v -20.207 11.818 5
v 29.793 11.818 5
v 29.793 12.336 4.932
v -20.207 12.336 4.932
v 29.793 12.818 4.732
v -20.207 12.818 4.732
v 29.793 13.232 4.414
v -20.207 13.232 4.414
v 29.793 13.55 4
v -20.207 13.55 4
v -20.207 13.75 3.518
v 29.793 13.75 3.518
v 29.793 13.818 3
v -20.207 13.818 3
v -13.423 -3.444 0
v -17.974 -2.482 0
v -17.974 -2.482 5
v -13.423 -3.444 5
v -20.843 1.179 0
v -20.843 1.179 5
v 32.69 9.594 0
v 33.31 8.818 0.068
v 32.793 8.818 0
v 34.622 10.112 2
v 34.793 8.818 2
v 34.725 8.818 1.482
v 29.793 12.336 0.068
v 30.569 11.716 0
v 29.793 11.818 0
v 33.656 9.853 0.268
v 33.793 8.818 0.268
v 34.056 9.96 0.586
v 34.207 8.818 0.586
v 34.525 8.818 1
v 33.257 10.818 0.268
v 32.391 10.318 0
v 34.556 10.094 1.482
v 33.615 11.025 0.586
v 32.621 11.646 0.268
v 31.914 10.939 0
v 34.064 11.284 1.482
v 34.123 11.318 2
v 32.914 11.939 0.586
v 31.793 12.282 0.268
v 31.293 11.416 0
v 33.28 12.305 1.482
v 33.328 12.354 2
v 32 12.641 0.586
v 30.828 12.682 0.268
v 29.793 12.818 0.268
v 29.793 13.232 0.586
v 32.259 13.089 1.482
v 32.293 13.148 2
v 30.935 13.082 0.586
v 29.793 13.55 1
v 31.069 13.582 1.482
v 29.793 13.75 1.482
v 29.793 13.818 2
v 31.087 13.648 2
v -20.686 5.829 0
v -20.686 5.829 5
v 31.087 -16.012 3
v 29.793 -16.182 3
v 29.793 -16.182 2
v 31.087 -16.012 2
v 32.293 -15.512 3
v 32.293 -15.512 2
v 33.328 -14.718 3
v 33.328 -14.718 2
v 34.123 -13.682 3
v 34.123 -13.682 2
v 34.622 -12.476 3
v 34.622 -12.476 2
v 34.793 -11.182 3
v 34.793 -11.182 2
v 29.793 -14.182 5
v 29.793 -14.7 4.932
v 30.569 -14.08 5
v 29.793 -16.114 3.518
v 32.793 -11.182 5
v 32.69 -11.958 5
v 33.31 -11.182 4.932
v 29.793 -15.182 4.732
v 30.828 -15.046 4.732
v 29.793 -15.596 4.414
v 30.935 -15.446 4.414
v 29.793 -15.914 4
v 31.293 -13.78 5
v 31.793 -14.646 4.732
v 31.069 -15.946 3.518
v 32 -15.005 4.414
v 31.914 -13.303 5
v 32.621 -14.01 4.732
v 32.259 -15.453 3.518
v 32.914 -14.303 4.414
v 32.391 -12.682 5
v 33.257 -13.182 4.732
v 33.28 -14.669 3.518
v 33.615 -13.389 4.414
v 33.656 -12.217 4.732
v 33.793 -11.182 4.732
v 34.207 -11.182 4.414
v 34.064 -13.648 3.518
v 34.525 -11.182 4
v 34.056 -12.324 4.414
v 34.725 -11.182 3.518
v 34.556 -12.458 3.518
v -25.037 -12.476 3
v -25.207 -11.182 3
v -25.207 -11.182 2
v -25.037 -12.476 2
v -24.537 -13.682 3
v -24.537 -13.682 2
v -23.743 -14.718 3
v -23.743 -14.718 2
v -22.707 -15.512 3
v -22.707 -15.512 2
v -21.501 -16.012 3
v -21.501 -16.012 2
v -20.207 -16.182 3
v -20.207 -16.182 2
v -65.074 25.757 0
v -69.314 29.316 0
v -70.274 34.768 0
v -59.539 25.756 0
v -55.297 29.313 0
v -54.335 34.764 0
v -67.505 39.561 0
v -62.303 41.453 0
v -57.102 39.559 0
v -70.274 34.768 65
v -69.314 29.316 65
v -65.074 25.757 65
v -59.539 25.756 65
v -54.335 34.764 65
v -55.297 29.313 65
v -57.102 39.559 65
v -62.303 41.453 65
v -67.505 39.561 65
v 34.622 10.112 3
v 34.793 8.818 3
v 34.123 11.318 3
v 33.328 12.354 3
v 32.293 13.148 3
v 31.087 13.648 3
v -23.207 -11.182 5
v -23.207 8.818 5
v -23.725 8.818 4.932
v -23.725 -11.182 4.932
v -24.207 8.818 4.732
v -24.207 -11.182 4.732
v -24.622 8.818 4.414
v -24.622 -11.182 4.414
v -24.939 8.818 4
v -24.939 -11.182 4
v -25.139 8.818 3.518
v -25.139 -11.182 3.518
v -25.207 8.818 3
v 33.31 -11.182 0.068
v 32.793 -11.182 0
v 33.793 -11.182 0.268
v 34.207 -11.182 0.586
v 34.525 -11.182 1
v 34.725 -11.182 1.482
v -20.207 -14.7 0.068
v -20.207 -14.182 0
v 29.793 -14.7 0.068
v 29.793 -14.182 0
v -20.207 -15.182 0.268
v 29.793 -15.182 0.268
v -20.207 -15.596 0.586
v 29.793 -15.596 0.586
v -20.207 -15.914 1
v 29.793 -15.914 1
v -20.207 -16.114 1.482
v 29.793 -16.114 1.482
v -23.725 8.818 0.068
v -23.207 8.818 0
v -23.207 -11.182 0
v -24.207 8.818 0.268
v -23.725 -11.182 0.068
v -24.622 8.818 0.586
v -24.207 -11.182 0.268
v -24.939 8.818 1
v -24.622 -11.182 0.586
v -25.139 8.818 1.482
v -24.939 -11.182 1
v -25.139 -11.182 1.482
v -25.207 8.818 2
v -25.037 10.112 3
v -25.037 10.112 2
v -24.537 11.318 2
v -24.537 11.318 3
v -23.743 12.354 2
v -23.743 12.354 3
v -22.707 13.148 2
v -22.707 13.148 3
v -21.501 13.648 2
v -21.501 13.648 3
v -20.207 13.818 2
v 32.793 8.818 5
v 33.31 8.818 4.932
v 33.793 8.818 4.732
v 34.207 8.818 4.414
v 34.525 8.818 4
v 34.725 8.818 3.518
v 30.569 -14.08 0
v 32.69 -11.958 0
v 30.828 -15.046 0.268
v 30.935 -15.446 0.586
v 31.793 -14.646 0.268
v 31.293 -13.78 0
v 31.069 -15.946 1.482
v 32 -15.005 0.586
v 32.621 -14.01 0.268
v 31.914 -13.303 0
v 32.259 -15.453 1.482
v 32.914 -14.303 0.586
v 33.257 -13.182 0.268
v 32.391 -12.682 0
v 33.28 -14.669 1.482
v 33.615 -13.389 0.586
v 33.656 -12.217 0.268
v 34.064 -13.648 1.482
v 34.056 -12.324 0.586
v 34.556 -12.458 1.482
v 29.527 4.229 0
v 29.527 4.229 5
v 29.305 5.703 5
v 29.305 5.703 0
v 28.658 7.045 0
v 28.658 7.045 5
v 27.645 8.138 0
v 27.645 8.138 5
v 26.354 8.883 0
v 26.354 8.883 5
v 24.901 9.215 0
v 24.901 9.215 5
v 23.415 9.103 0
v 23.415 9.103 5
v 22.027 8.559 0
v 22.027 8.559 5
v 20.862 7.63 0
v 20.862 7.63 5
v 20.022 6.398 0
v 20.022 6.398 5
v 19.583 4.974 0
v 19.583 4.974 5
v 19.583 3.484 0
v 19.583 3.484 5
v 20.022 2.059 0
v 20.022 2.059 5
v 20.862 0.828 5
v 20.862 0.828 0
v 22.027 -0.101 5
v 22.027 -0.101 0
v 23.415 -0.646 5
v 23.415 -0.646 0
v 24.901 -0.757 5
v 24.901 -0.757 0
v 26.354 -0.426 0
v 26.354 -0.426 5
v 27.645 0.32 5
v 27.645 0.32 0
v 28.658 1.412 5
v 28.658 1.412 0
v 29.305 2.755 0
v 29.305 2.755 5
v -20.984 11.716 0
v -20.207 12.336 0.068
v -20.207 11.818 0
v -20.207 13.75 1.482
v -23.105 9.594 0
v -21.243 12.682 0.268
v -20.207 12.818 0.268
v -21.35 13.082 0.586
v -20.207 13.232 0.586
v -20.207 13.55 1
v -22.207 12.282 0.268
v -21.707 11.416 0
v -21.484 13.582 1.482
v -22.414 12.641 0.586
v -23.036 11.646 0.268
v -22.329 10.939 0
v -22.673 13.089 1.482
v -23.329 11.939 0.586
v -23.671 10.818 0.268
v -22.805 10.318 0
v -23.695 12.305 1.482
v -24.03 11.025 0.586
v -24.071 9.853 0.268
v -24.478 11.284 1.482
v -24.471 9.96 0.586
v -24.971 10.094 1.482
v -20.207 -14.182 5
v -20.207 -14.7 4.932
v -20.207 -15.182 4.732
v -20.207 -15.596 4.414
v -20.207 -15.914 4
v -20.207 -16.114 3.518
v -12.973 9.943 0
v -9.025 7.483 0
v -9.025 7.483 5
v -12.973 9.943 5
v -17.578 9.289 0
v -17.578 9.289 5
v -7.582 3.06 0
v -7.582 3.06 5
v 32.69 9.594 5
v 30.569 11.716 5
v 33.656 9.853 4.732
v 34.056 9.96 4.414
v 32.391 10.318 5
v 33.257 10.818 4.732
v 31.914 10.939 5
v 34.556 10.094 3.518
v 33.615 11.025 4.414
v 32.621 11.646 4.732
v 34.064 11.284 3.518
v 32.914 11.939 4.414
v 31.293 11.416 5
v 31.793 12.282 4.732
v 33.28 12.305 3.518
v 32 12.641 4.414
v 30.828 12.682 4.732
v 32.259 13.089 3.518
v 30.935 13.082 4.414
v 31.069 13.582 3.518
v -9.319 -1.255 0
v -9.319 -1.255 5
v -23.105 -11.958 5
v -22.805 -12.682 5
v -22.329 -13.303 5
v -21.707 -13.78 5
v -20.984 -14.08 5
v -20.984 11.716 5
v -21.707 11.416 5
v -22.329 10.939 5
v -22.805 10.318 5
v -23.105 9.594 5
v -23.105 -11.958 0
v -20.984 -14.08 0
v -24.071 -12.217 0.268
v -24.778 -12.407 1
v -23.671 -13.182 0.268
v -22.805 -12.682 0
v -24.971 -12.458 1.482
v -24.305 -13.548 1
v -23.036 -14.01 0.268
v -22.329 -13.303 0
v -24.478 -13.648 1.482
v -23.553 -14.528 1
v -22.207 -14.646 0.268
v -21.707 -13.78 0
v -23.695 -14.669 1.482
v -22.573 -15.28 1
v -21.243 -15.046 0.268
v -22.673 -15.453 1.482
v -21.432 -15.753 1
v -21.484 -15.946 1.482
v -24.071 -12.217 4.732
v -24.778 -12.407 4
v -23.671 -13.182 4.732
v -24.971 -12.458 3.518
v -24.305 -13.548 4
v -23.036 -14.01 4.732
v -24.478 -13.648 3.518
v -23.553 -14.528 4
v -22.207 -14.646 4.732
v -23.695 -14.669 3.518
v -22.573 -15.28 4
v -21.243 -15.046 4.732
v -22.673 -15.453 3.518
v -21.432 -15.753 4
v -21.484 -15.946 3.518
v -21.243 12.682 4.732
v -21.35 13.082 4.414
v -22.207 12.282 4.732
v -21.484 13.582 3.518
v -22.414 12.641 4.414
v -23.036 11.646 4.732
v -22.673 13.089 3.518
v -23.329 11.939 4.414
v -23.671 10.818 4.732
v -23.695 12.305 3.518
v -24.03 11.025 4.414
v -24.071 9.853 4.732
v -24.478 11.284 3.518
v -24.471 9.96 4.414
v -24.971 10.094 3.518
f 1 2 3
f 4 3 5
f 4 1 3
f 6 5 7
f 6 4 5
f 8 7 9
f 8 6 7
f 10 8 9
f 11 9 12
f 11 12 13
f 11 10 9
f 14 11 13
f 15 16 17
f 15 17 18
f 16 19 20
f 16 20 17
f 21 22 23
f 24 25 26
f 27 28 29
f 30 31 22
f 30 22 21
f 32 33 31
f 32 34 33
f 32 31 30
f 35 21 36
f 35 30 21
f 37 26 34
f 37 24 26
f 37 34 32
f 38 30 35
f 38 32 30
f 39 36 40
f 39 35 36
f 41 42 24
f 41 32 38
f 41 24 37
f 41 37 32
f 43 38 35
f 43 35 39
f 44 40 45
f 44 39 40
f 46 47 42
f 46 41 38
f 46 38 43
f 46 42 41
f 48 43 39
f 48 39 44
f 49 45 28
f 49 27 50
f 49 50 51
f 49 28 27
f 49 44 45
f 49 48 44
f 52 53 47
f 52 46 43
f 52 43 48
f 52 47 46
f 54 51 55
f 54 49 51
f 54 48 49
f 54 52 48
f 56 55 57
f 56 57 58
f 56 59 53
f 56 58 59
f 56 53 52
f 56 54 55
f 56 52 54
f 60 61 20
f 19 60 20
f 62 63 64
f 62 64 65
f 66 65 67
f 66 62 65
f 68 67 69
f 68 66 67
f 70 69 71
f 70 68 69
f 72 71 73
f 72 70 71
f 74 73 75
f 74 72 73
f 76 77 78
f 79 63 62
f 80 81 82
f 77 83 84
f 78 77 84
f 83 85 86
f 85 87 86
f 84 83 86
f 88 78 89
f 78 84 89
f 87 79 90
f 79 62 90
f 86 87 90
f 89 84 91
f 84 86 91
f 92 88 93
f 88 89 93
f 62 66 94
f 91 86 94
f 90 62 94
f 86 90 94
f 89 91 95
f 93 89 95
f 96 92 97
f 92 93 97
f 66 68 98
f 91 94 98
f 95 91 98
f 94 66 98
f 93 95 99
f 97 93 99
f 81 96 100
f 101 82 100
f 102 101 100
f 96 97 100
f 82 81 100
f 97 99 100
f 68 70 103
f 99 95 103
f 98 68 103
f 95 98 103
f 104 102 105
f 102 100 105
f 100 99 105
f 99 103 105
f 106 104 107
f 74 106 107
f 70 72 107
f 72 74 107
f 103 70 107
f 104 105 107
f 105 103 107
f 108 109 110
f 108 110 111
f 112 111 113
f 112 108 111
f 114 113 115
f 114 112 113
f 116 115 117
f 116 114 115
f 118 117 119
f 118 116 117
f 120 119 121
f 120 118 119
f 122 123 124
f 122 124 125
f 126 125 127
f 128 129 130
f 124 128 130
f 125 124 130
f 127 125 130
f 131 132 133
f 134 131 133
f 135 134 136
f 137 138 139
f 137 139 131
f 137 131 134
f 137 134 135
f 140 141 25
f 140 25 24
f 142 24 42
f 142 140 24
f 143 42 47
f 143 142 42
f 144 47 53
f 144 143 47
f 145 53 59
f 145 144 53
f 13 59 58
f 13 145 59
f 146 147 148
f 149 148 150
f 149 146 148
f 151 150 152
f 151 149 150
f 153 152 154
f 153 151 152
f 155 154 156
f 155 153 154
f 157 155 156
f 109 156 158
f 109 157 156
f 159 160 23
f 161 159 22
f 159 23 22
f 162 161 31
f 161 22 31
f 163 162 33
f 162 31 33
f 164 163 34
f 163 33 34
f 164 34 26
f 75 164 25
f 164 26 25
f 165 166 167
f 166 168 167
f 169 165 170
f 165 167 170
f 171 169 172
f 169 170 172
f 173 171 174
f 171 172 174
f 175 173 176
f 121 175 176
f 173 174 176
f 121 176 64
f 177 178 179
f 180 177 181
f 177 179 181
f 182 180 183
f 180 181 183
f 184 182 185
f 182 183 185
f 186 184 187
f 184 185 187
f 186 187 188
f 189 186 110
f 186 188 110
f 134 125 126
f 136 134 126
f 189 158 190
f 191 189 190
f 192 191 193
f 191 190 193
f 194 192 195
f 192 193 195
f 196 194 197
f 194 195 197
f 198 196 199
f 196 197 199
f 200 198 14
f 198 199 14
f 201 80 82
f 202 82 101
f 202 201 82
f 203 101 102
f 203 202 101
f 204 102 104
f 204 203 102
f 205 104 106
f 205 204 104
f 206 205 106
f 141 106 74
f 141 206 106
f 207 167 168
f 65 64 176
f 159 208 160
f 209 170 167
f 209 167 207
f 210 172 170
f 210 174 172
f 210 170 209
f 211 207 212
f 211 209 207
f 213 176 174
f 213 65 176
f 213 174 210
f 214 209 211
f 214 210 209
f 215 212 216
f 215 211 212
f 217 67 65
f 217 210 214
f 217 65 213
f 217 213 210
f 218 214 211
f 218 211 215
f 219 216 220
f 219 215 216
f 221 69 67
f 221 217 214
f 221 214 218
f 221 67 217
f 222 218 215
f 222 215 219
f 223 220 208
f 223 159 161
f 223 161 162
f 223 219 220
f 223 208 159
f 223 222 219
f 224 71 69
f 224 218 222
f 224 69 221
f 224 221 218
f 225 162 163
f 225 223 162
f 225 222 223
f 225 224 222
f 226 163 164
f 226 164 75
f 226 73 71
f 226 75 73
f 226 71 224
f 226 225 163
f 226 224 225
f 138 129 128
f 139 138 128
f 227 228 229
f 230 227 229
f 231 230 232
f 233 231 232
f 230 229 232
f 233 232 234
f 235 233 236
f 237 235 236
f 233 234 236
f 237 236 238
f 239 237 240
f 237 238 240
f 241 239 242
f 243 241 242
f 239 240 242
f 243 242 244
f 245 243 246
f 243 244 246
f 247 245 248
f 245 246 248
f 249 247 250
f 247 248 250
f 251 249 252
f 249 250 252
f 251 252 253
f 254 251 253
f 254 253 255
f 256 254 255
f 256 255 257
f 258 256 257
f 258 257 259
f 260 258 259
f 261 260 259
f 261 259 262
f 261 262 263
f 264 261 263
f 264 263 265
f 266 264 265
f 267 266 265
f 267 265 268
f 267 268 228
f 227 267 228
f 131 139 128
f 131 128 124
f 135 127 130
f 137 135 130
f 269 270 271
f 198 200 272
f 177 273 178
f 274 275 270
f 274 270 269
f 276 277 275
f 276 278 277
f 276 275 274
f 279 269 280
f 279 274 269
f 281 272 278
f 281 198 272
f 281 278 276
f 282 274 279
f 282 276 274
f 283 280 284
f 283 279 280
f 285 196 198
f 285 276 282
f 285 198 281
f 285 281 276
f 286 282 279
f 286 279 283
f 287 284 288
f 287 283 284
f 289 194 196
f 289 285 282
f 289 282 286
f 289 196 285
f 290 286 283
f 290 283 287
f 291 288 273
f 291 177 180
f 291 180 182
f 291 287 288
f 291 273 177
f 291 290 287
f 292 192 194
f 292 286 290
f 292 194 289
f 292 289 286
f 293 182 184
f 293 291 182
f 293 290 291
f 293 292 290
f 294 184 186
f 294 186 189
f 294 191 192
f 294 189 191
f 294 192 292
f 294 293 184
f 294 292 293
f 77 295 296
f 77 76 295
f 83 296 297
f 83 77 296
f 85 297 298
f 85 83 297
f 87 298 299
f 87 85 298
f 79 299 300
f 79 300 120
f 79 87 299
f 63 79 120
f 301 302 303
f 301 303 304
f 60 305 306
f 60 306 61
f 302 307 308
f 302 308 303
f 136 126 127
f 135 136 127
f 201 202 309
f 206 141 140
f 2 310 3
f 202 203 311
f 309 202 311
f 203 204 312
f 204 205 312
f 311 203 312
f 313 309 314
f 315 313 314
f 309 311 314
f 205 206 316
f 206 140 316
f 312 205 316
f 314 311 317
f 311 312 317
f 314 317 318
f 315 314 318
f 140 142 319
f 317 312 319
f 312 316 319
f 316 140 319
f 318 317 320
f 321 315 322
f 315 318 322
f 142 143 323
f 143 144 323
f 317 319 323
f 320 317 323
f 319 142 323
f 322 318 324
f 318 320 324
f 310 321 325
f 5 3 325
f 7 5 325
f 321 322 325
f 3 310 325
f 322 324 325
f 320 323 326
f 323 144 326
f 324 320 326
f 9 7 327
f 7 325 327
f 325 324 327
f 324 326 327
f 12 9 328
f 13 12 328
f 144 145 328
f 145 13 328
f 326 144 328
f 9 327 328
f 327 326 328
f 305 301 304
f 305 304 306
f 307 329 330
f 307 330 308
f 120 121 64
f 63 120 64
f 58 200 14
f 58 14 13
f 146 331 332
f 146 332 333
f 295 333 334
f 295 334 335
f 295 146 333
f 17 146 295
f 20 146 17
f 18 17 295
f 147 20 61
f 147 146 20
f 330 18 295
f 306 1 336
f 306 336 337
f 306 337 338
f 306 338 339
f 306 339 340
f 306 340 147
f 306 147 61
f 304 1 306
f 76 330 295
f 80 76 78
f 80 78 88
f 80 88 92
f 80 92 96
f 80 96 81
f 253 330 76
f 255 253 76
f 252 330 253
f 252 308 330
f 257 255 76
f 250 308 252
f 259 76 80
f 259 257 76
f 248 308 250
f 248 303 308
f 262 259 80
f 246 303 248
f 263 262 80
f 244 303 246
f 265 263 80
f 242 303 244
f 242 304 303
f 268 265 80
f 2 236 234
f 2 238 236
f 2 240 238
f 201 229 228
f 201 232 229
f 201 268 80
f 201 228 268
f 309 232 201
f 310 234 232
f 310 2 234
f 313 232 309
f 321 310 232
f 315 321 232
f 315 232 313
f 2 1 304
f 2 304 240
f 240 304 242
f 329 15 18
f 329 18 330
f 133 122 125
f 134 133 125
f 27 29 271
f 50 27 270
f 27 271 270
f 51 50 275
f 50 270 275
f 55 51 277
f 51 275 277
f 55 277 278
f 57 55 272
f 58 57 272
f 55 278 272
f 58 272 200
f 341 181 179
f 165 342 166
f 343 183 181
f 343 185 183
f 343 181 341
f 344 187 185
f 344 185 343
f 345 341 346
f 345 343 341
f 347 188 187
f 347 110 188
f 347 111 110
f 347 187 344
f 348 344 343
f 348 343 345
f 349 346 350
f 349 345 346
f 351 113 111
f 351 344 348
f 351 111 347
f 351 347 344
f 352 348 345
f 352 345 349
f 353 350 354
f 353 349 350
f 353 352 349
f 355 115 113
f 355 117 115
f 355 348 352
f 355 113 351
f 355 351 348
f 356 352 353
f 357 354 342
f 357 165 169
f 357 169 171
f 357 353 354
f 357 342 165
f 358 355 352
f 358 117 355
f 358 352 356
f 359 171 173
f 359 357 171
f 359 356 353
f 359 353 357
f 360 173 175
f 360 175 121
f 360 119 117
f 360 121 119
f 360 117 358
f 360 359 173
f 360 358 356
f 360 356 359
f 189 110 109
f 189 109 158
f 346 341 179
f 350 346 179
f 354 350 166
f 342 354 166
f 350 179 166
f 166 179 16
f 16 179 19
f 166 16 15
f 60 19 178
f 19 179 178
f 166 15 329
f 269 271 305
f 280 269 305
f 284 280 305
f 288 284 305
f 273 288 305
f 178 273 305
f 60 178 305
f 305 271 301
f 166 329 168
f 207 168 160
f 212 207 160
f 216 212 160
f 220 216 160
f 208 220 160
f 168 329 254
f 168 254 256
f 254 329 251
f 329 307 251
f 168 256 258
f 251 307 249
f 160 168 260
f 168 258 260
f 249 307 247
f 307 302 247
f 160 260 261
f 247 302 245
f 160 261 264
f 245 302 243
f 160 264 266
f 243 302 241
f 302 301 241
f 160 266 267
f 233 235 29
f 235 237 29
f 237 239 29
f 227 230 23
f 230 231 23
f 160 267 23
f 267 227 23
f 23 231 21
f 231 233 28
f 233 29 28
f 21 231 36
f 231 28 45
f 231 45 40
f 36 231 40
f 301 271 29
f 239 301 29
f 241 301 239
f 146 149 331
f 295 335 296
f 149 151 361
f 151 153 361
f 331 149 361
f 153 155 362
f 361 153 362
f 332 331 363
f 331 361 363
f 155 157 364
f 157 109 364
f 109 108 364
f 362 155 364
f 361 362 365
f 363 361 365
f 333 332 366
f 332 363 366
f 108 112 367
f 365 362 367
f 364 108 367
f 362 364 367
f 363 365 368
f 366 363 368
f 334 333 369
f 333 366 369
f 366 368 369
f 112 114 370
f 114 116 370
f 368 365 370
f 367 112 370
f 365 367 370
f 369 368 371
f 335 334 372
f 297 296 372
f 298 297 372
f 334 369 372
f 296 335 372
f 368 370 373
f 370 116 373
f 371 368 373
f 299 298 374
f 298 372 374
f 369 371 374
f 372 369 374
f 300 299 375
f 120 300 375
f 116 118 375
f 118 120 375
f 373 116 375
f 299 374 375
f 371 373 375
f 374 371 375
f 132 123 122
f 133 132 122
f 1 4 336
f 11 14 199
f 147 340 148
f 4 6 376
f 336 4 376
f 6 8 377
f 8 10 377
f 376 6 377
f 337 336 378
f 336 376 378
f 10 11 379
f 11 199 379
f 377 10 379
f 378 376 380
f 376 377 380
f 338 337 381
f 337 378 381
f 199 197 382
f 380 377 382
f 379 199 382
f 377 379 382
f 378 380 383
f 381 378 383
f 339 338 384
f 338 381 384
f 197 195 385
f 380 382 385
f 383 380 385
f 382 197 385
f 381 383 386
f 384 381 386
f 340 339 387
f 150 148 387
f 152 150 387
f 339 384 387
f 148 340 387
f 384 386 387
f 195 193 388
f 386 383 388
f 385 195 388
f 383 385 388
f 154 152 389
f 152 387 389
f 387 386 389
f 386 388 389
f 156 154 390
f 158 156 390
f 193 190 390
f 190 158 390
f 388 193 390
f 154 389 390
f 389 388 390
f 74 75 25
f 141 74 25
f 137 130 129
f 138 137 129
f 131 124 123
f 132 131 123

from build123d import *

# Parameters (mm, degrees)
F0_W      = 60
F0_H      = 30
F1_DEPTH  = 5
F2_R      = 5
F3_R      = 2
F4_R      = 2
F5_R      = 5
F6_DEPTH  = 12.5
F8_DEPTH  = 12.5
F10_DEPTH = 65


with BuildPart() as f1:
    # F0 (on Top) → F1 (new body)
    with BuildSketch(Plane.XY):
        with Locations((4.792662, -1.181989)):
            Rectangle(F0_W, F0_H)
    extrude(amount=F1_DEPTH)

    # F2
    f2_edges = [f1.edges().sort_by_distance(p)[0] for p in [
        (-25.207338, -16.181989, 2.5),
        (34.792662, -16.181989, 2.5),
        (34.792662, 13.818011, 2.5),
        (-25.207338, 13.818011, 2.5),
    ]]
    fillet(f2_edges, radius=F2_R)

    # F3
    f3_edges = [f1.edges().sort_by_distance(p)[0] for p in [
        (4.792662, -16.181989, 5),
        (-25.207338, -1.181989, 5),
        (4.792662, 13.818011, 5),
        (34.792662, -1.181989, 5),
    ]]
    fillet(f3_edges, radius=F3_R)

    # F4
    f4_edges = [f1.edges().sort_by_distance(p)[0] for p in [
        (4.792662, -16.181989, 0),
        (-25.207338, -1.181989, 0),
        (4.792662, 13.818011, 0),
        (34.792662, -1.181989, 0),
    ]]
    fillet(f4_edges, radius=F4_R)

    # F5 (on face) → F6 (cut, symmetric)
    with BuildSketch(Plane.XY.offset(5)):
        with Locations((24.527146, 4.22882)):
            Circle(F5_R)
    extrude(amount=-F6_DEPTH, both=True, mode=Mode.SUBTRACT)

    # F7 (on face) → F8 (cut, symmetric)
    with BuildSketch(Plane.XY.offset(5)):
        Polygon((-13.423043, -3.44386), (-9.318605, -1.254827), (-7.581507, 3.060351), (-9.024555, 7.482555), (-12.972532, 9.942586), (-17.578136, 9.289368), (-20.686352, 5.828549), (-20.842813, 1.179485), (-17.974308, -2.482475), align=None)
    extrude(amount=-F8_DEPTH, both=True, mode=Mode.SUBTRACT)


with BuildPart() as f10:
    # F9 (on Top) → F10 (new body)
    with BuildSketch(Plane.XY):
        Polygon((-59.538589, 25.75572), (-55.297336, 29.312899), (-54.334859, 34.764081), (-57.101511, 39.558597), (-62.302745, 41.45304), (-67.504845, 39.560979), (-70.273692, 34.76773), (-69.313711, 29.316108), (-65.074087, 25.756987), align=None)
    extrude(amount=F10_DEPTH)


solid = Compound([f1.part, f10.part])
